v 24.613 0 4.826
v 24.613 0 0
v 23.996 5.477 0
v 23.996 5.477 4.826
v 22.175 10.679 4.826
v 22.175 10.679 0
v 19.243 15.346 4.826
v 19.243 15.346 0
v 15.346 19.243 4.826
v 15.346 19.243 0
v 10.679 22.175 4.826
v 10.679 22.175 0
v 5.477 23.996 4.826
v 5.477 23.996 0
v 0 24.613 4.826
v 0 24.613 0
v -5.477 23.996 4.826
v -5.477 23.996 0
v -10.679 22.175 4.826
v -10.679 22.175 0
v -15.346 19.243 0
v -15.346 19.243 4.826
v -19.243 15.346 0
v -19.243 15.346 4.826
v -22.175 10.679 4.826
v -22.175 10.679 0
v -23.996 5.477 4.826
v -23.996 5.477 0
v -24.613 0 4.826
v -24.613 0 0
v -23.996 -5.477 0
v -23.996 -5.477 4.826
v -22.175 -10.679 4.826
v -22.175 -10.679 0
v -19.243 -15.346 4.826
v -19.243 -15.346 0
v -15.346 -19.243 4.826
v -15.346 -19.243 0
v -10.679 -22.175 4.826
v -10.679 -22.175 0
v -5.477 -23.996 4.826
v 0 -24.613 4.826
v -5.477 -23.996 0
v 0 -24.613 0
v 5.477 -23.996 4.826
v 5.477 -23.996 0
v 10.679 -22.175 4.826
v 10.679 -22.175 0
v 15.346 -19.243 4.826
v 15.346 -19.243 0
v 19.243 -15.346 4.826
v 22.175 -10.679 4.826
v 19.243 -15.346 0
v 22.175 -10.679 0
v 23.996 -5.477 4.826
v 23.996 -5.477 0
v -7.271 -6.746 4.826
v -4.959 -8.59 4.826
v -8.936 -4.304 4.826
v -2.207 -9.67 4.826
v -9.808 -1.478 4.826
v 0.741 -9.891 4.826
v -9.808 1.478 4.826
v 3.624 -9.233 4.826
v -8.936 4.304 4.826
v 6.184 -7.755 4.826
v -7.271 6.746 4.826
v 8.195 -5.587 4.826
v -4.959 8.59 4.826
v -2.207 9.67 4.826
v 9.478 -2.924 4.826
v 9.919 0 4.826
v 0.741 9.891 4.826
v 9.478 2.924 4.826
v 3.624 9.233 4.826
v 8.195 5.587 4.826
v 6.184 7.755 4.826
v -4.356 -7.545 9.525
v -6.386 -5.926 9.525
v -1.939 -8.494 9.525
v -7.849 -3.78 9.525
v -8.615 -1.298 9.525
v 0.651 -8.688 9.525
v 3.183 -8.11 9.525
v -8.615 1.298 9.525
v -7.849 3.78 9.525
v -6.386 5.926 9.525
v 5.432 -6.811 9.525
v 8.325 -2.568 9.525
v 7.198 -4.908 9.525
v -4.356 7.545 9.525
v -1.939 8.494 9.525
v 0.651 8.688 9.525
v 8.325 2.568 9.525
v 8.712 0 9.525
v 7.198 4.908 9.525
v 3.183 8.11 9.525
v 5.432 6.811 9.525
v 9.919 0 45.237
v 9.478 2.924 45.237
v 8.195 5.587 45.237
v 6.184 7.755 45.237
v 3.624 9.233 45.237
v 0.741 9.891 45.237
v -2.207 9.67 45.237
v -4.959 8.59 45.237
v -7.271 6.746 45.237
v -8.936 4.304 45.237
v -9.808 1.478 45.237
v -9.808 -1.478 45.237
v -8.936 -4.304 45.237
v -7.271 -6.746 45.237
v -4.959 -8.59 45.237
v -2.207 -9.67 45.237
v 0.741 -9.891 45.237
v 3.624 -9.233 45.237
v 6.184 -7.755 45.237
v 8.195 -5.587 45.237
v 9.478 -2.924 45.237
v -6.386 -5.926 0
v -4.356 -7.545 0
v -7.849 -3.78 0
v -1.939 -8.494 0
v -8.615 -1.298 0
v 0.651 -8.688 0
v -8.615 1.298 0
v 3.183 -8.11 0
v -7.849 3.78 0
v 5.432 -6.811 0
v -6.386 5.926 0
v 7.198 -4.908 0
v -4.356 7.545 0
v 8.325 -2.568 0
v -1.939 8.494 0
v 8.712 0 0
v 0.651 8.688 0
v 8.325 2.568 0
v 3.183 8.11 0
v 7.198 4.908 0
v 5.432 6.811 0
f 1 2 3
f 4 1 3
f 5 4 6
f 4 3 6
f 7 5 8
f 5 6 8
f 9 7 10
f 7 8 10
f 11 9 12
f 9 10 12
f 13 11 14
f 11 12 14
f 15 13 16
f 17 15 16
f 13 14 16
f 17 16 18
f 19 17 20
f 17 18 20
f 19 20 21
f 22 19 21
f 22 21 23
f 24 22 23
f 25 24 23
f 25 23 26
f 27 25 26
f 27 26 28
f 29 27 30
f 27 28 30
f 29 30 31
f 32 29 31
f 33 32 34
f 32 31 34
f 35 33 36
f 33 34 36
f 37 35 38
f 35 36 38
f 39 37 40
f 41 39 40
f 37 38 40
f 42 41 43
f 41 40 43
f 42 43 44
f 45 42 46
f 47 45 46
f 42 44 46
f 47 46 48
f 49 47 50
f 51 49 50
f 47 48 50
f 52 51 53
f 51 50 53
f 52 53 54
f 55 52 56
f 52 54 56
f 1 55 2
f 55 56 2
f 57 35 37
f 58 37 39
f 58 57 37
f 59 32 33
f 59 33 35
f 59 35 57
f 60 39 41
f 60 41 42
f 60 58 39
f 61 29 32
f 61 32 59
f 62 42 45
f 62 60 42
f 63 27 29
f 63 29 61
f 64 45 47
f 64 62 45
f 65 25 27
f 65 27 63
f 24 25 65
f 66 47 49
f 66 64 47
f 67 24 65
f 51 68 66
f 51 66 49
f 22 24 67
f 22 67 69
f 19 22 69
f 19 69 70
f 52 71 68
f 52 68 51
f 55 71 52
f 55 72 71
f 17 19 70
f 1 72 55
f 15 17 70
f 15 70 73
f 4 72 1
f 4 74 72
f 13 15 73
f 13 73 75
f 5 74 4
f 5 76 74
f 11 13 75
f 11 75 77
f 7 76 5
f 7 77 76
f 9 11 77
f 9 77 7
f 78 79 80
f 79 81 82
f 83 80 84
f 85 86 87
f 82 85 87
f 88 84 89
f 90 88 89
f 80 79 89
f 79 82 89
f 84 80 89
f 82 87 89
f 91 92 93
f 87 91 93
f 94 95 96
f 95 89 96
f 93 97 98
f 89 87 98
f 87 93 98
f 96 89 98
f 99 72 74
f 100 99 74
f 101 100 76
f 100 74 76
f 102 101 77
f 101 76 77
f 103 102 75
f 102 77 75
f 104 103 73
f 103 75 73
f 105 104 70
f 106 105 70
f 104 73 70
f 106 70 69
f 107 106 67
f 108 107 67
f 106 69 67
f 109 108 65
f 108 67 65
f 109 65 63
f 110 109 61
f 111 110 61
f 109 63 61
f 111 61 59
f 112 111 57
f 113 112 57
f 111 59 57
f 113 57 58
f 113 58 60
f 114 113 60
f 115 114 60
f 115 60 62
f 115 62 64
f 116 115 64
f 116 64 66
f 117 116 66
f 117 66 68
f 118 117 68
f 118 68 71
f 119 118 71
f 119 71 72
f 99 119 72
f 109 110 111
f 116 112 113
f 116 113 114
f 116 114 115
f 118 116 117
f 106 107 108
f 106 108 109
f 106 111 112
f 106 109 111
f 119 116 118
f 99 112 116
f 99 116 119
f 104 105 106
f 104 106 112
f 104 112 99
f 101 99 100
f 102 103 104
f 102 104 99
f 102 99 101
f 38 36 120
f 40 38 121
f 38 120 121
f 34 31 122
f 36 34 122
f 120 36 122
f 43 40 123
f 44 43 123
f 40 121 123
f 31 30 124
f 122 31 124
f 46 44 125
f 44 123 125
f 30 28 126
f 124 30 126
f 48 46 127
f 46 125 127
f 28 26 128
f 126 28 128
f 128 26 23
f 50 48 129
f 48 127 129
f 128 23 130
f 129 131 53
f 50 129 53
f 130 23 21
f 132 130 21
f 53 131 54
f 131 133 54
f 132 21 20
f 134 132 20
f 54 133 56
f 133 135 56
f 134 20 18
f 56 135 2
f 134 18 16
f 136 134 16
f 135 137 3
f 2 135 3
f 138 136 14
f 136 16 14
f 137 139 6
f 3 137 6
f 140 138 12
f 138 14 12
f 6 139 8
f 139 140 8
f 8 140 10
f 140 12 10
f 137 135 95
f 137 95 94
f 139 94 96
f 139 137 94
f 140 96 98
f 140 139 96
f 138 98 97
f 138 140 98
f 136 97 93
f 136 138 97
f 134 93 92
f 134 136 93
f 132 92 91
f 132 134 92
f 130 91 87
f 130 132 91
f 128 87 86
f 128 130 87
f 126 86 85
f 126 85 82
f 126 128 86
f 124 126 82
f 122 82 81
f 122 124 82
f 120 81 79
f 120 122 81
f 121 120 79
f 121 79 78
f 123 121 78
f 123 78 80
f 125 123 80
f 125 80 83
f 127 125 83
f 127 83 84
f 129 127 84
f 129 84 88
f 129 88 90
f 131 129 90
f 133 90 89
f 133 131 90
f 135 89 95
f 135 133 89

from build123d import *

# Parameters (mm, degrees)
SKETCH1_R           = 24.6126
BOSS_EXTRUDE1_DEPTH = 4.826
SKETCH2_R           = 9.9187
BOSS_EXTRUDE2_DEPTH = 45.2374
SKETCH3_R           = 8.7122
CUT_EXTRUDE1_DEPTH  = 9.525


with BuildPart() as part:
    # Sketch1 → Boss-Extrude1 (new body)
    with BuildSketch(Plane.XY):
        Circle(SKETCH1_R)
    extrude(amount=BOSS_EXTRUDE1_DEPTH)

    # Sketch2 → Boss-Extrude2 (add)
    with BuildSketch(Plane.XY):
        Circle(SKETCH2_R)
    extrude(amount=BOSS_EXTRUDE2_DEPTH)

    # Sketch3 → Cut-Extrude1 (cut)
    with BuildSketch(Plane.XY):
        Circle(SKETCH3_R)
    extrude(amount=CUT_EXTRUDE1_DEPTH, mode=Mode.SUBTRACT)


solid = part.part
